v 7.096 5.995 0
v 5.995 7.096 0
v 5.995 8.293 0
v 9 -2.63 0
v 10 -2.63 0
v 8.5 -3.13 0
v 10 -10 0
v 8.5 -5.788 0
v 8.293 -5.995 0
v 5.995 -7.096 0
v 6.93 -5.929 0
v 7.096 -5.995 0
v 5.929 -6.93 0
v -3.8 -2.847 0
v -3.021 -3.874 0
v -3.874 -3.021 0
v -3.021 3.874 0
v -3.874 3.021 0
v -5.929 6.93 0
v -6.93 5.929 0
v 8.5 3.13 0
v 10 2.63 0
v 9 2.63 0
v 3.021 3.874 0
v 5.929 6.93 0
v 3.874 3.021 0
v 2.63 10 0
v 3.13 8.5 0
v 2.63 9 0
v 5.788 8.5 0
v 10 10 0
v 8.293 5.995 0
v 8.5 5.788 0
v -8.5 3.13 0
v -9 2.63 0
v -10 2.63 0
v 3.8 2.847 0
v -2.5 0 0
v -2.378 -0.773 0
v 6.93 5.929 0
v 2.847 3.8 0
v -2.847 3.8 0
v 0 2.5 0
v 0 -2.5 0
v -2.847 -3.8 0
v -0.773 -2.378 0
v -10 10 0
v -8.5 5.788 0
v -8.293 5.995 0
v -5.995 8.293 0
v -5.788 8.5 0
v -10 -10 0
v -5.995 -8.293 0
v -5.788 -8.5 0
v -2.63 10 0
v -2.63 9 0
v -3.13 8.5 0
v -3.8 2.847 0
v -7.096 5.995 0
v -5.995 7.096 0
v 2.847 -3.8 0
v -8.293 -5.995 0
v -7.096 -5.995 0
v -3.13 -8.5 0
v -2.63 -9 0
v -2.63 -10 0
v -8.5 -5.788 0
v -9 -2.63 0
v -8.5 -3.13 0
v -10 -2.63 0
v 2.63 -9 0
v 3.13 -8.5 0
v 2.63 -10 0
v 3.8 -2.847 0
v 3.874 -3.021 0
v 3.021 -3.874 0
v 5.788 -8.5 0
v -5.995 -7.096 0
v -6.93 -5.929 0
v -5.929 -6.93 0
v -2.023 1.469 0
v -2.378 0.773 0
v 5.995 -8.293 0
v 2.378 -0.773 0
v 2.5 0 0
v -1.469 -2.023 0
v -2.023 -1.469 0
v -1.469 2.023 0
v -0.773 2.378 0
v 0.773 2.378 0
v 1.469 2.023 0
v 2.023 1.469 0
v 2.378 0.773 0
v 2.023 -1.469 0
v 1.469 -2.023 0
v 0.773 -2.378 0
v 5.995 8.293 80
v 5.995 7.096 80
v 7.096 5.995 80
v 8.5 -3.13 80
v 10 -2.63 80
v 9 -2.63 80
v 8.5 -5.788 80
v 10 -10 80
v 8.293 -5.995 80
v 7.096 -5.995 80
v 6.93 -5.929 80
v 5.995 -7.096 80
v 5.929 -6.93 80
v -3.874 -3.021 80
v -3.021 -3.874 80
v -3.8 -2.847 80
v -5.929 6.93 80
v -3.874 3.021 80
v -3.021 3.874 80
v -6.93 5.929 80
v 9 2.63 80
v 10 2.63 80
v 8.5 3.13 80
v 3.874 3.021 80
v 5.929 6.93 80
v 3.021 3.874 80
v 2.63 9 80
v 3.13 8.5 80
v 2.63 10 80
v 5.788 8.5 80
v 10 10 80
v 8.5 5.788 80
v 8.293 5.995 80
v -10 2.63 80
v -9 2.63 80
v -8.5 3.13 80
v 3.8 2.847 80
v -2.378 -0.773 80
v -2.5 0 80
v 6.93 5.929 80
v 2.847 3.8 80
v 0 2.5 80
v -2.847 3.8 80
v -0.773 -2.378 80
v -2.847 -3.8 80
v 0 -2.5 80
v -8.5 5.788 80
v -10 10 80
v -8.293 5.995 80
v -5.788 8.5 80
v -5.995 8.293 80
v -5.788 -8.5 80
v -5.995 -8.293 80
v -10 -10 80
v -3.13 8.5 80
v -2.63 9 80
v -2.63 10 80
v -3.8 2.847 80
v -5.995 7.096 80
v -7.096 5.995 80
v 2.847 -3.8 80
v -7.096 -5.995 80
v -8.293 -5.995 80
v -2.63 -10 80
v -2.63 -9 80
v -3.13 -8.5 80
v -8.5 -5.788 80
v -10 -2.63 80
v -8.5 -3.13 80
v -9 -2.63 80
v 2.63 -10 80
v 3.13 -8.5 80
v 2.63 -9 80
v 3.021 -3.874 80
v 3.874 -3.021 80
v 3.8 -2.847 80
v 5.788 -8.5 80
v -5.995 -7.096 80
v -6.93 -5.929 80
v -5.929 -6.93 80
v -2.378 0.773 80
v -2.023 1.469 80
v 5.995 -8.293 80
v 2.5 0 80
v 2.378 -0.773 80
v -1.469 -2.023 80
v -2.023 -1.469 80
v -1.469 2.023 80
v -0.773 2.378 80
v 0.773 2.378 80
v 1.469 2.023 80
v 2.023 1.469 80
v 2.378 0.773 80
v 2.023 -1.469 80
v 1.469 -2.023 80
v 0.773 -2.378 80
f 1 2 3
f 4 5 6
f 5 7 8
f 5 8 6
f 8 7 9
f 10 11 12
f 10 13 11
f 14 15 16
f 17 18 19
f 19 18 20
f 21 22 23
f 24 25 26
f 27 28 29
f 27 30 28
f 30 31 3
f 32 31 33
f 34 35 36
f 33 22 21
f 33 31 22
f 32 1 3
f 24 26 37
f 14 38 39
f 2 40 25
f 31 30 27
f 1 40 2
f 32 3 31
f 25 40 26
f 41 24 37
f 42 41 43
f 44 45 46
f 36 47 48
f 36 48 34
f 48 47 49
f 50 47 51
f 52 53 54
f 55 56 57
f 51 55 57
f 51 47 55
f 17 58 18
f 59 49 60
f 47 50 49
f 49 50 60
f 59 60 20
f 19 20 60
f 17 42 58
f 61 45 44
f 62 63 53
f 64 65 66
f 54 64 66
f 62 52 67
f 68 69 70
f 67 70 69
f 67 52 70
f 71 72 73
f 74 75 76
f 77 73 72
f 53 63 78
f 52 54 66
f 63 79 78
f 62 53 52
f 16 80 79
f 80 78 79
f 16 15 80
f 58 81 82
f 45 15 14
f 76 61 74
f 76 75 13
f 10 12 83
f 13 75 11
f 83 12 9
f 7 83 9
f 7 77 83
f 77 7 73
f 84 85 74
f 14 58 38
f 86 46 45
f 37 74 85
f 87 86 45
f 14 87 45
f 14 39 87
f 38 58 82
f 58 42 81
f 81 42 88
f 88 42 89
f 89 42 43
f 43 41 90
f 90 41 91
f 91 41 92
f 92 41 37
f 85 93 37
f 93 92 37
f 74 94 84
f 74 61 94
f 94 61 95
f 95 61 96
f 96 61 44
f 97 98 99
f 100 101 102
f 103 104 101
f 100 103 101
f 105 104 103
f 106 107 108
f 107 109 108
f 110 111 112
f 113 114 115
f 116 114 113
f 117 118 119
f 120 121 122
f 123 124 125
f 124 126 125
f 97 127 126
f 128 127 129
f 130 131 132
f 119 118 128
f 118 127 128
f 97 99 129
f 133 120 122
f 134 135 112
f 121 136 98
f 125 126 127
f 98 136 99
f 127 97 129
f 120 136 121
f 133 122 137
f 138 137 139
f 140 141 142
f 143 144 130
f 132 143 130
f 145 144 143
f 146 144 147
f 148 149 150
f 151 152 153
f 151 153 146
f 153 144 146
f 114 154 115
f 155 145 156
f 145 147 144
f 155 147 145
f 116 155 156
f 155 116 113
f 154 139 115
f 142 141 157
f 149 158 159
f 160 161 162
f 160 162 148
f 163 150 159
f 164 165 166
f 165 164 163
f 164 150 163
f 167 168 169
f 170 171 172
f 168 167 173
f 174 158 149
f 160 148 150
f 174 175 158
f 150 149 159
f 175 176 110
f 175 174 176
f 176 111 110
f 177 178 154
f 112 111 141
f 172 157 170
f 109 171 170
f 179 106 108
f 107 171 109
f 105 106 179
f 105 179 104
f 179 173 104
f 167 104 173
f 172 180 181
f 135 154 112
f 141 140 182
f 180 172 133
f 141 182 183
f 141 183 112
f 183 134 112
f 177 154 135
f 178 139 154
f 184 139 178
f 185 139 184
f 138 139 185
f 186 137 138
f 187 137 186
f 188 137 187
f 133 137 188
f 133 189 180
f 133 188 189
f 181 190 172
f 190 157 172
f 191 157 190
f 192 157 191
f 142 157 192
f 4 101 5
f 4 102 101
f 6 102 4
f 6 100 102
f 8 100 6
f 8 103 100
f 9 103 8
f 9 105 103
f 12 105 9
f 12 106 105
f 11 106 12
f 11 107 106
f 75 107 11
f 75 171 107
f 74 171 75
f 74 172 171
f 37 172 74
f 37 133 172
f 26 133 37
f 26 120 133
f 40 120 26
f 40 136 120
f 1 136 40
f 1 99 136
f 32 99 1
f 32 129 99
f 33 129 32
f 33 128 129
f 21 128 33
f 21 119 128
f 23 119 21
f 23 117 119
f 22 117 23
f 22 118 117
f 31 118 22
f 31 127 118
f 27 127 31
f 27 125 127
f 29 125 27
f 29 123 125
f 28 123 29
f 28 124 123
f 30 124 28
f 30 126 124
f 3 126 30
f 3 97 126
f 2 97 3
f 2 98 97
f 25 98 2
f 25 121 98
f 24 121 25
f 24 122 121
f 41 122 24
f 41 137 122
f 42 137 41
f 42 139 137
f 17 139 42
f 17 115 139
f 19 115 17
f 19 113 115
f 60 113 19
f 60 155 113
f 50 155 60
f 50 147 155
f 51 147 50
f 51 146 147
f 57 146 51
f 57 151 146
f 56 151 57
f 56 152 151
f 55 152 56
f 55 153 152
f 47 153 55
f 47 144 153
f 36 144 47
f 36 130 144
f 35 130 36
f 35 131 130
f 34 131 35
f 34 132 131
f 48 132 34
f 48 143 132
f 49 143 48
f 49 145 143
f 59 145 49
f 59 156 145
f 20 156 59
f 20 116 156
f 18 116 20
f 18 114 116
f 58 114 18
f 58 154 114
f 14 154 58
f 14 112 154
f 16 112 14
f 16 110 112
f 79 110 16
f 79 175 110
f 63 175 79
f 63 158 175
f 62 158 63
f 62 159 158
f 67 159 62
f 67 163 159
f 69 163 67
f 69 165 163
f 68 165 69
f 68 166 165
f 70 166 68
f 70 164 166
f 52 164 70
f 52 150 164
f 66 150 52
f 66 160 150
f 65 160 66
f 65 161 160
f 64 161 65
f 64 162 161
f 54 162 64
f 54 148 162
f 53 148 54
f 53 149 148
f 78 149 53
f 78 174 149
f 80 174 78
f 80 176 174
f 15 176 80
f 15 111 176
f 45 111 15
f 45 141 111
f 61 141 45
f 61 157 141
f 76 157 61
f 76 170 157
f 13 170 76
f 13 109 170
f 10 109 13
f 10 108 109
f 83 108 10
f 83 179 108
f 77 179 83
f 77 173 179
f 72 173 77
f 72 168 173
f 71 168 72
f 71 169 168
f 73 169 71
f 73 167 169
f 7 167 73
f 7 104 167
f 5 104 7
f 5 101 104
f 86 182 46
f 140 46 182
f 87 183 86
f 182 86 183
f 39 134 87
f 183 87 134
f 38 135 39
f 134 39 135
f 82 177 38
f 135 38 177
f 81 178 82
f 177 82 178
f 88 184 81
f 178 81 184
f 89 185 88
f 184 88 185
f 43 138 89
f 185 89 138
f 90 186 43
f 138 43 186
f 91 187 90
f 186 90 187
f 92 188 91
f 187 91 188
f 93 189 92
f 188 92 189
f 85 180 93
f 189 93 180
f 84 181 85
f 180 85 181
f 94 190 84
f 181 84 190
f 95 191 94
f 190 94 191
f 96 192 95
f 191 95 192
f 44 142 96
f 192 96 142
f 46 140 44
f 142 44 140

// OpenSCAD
module slot_2d(neck_width, material_thickness, slot_top_width, slot_base_width, slot_depth) {
    // Create the profile of a single slot
    //    The opening, or neck goes from the slot out to the surface.
    //    The slot is a rectangle with a trapezoidal cross section.
    //    The top width, faces the surface, and the base width is the width at the bottom.
    //    slot_depth is the depth of the trapezoid.
    fillet = 0.5;
    offset(r = -fillet) offset(r = +fillet) {
        union() {
            /* make the neck */
            translate([0, material_thickness/2 ,0]) {
                square(size=[neck_width, material_thickness+1], center=true);
            }
            /* simple rect slot */
            translate([0, material_thickness, 0]) {
                // trapezoid(size=[slot_top_width, slot_base_width, slot_depth], center=true);
                // square(size=[slot_top_width, slot_depth], center=true);
                // Make a trapezoid with a polygon
                // additional thickness is same as the material_thickness
                polygon(points=[
                    [-slot_top_width/2,  0],
                    [slot_top_width/2,   0],
                    [slot_top_width/2,   material_thickness],
                    [slot_base_width/2,  slot_depth],
                    [-slot_base_width/2, slot_depth],
                    [-slot_top_width/2,  material_thickness],
                ]);
            }
        }
    }
}

module extrusion_profile(profile_side_length, neck_width, material_thickness, slot_top_width, slot_base_width, slot_depth, hole_radius) {
    difference() {
        square(size=[profile_side_length, profile_side_length], center=true);
        translate([0, -profile_side_length/2, 0]) {
            slot_2d(neck_width, material_thickness, slot_top_width, slot_base_width, slot_depth);
        }
        rotate([0, 0, 90]) {
            translate([0, -profile_side_length/2, 0]) {
                slot_2d(neck_width, material_thickness, slot_top_width, slot_base_width, slot_depth);
            }
        }
        rotate([0, 0, 180]) {
            translate([0, -profile_side_length/2, 0]) {
                slot_2d(neck_width, material_thickness, slot_top_width, slot_base_width, slot_depth);
            }
        }
        rotate([0, 0, 270]) {
            translate([0, -profile_side_length/2, 0]) {
                slot_2d(neck_width, material_thickness, slot_top_width, slot_base_width, slot_depth);
            }
        }
        // Make the center hole
        translate([0, 0, 0]) {
            circle(r=hole_radius, $fn=20);
        }
    }
}

// extrusion_profile(20, 5.26, 1.5, 11.99, 5.9, 4.7, 2.5);

linear_extrude(height=80) {
    extrusion_profile(20, 5.26, 1.5, 11.99, 5.9, 4.7, 2.5);
}
